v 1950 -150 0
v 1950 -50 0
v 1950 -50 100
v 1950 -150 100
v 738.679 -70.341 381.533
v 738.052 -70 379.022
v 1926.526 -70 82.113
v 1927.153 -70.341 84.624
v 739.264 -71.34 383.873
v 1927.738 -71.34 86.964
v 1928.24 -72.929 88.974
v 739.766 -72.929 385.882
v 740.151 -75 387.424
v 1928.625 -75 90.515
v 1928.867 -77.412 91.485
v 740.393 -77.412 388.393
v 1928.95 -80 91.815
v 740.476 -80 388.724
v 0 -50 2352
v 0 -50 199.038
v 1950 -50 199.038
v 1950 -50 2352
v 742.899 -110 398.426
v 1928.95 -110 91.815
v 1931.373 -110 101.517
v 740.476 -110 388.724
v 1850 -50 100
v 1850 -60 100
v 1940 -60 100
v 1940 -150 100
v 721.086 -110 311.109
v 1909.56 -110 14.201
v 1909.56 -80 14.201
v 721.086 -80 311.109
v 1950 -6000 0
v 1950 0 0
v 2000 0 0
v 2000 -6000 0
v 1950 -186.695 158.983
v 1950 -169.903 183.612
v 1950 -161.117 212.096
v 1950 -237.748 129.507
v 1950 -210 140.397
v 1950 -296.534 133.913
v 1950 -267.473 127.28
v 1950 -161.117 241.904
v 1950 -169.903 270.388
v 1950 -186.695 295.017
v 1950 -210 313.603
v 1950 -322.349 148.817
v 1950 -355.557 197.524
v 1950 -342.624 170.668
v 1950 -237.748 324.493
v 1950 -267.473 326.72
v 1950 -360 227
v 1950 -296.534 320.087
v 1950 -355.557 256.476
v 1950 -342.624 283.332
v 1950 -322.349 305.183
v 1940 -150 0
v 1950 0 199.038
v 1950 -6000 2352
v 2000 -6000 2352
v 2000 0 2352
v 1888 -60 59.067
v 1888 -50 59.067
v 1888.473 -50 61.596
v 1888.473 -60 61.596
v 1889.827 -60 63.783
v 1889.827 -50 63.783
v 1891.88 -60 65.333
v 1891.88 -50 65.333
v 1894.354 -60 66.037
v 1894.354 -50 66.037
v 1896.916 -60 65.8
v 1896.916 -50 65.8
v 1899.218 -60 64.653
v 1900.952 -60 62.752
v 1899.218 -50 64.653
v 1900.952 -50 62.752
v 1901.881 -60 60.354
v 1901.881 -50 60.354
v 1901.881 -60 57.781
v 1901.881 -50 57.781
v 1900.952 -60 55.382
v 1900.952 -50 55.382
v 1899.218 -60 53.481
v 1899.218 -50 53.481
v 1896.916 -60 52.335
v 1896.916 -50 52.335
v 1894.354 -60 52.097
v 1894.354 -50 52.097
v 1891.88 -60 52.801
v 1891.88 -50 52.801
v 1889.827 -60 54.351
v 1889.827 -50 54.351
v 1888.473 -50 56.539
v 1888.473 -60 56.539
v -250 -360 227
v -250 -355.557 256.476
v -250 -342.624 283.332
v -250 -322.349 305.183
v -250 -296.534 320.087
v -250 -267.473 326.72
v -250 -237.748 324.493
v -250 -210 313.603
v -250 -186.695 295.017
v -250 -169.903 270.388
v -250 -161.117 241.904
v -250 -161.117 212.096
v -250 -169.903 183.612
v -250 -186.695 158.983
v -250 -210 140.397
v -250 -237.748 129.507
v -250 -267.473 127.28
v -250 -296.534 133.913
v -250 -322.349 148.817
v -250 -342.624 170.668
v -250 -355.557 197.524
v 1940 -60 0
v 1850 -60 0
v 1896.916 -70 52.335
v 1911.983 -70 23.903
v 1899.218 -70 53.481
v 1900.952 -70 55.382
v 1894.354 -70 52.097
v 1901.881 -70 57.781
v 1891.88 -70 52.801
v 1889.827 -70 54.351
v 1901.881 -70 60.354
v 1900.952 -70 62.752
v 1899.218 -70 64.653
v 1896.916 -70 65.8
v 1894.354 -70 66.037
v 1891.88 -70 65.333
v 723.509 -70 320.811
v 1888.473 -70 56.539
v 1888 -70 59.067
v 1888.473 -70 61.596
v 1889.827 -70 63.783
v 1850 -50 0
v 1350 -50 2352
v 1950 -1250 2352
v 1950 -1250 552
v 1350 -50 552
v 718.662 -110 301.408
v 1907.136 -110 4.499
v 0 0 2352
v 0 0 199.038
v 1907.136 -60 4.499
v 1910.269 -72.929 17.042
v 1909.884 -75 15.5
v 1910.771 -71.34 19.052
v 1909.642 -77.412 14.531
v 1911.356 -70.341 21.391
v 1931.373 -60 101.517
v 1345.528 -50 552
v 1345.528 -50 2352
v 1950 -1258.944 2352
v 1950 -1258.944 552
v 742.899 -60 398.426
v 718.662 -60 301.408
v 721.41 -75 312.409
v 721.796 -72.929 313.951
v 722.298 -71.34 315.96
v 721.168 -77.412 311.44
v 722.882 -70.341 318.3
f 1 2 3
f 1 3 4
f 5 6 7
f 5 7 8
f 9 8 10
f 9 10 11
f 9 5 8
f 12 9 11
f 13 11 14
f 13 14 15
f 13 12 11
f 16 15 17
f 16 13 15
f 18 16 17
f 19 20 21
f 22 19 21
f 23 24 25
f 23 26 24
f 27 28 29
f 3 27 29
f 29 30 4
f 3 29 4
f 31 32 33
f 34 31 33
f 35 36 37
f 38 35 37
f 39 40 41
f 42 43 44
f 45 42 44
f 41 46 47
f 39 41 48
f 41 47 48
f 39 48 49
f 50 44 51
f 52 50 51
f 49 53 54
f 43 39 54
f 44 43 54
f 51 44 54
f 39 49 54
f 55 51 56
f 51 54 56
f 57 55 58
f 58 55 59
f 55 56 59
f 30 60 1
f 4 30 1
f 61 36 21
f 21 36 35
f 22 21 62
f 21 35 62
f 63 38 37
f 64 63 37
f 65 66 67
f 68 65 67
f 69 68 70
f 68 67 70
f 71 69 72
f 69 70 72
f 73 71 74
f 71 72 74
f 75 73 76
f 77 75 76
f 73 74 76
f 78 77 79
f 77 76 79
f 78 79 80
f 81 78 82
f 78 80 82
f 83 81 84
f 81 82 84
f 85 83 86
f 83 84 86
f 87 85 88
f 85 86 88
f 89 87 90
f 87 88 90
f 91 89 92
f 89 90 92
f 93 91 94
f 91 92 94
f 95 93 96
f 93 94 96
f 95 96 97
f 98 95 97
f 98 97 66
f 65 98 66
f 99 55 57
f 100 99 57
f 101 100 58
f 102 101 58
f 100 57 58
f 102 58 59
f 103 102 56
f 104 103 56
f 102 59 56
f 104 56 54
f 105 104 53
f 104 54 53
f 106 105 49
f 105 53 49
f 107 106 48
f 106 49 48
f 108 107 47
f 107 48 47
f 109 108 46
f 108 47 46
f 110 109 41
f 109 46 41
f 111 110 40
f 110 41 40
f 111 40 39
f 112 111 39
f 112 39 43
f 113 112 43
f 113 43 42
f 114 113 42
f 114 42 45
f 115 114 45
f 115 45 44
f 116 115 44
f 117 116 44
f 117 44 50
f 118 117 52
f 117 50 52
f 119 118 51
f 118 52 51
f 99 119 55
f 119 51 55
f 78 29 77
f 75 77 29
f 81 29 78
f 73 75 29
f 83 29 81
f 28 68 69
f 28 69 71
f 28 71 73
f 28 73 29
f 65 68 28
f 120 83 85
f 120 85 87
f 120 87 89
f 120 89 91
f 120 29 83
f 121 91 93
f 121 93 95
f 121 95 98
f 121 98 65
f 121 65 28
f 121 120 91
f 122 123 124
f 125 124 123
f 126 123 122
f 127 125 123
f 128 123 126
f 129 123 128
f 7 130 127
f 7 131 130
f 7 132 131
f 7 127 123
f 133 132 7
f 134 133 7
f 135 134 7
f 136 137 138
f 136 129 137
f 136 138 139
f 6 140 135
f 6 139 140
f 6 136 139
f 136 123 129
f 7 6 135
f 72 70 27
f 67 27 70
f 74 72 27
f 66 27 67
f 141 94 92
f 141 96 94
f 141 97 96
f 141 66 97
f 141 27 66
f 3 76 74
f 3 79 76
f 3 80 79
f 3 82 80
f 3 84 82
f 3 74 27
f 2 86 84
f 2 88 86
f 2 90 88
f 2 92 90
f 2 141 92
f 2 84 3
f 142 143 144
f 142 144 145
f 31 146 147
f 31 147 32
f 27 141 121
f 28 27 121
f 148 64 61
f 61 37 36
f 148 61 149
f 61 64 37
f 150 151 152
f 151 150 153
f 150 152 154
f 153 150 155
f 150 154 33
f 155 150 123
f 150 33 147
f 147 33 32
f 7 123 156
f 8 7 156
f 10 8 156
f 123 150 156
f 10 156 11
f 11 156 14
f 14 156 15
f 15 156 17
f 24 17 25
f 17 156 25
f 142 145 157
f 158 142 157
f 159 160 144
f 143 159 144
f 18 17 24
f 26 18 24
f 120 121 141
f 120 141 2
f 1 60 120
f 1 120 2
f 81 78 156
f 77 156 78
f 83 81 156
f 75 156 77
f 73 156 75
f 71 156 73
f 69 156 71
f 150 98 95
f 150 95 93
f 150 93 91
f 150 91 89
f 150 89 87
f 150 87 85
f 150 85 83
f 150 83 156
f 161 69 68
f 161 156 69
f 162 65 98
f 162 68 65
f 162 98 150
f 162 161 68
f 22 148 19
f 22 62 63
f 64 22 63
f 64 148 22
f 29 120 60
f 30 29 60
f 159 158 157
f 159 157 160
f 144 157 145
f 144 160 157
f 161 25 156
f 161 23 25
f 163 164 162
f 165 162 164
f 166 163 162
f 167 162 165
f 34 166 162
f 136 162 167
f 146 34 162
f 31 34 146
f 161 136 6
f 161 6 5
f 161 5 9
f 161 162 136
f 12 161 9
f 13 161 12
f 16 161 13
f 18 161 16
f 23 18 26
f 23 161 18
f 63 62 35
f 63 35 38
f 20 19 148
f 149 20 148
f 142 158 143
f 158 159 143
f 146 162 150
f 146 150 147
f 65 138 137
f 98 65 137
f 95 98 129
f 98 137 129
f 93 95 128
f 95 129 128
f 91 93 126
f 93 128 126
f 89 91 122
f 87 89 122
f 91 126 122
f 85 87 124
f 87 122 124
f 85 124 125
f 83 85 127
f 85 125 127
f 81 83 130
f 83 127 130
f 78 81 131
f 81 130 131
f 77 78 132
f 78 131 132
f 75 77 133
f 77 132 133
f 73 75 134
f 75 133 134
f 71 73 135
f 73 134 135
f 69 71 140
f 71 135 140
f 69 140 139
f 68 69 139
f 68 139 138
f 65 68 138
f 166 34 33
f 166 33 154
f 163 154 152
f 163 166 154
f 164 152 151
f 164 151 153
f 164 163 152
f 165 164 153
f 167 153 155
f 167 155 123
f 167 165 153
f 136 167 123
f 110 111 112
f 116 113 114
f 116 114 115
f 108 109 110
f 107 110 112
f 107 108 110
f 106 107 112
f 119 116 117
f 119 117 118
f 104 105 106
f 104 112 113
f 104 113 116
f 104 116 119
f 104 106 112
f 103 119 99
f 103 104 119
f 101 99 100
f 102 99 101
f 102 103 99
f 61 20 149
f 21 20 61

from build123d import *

# Parameters (mm, degrees)
F0_W           = 1950
F0_H           = 50
F0_W_2         = 50
F0_H_2         = 5950
F1_DEPTH       = 2352
F2_R           = 100
F2_R_2         = 50
F3_DEPTH       = 2200
F5_DEPTH       = 1800
F6_W           = 1950
F6_H           = 199.0381479263
F7_DEPTH       = 50.001
F8_W           = 10
F8_H           = 10
F8_W_2         = 90
F8_H_2         = 90
F9_DEPTH       = 100
F13_DEPTH      = 1200
F13_DEPTH_BACK = 25
F14_D          = 14
F14_DEPTH      = 12.75
F14_TIP        = 4.2060243332
F15_D          = 14
F15_DEPTH      = 12.75
F15_TIP        = 4.2060243332


with BuildPart() as f1:
    # F0 (on Top) → F1 (new body)
    with BuildSketch(Plane.XY):
        with Locations((975, -25)):
            Rectangle(F0_W, F0_H)
        with Locations((1975, -25)):
            Rectangle(F0_W_2, F0_H)
        with Locations((1975, -3025)):
            Rectangle(F0_W_2, F0_H_2)
    extrude(amount=F1_DEPTH)

    # F6 (on face) → F7 (cut, through all)
    with BuildSketch(Plane.XZ.offset(50)):
        with Locations((975, 99.5190739632)):
            Rectangle(F6_W, F6_H)
    extrude(amount=-F7_DEPTH, mode=Mode.SUBTRACT)


with BuildPart() as f3:
    # F2 (on face) → F3 (new body)
    with BuildSketch(Plane(origin=(1950, 0, 0), x_dir=(0, -1, 0), z_dir=(-1, 0, 0))):
        with Locations((260, 227)):
            Circle(F2_R)
        with Locations((260, 227)):
            Circle(F2_R_2, mode=Mode.SUBTRACT)
        with Locations((260, 227)):
            Circle(F2_R_2)
    extrude(amount=F3_DEPTH)


with BuildPart() as f5:
    # F4 (on face) → F5 (new body)
    with BuildSketch(Plane.XY.offset(2352)):
        Polygon((1350, -50), (1345.527864045, -50), (1950, -1258.94427191), (1950, -1250), align=None)
    extrude(amount=-F5_DEPTH)


with BuildPart() as f9:
    # F8 (on face) → F9 (new body)
    with BuildSketch(Plane(origin=(0, 0, 0), x_dir=(1, 0, 0), z_dir=(0, 0, -1))):
        with Locations((1945, 55)):
            Rectangle(F8_W, F8_H)
        with Locations((1895, 55)):
            Rectangle(F8_W_2, F8_H)
        with Locations((1945, 105)):
            Rectangle(F8_W, F8_H_2)
    extrude(amount=-F9_DEPTH)

    # F15
    with Locations(Plane.XZ.offset(60)):
        with Locations((1895, 59.0673498809)):
            Hole(F15_D / 2, depth=F15_DEPTH)
            with Locations((0, 0, -(F15_DEPTH + F15_TIP / 2))):  # 118° drill point
                Cone(0, F15_D / 2, F15_TIP, mode=Mode.SUBTRACT)


with BuildPart() as f13:
    # F12 (on line) → F13 (new body, two sides)
    with BuildSketch(Plane(origin=(1769.7879097987, 0, -442.1347269633), x_dir=(0, -1, 0), z_dir=(-0.9701827628, 0, 0.2423745176))) as f13_sk:
        with BuildLine():
            Line((60, 566.6058355899), (60, 545.4111338776))
            Line((60, 545.4111338776), (60, 516.6058355899))
            Line((60, 516.6058355899), (60, 466.6058355899))
            Line((60, 466.6058355899), (110, 466.6058355899))
            Line((110, 466.6058355899), (110, 476.6058355899))
            Line((110, 476.6058355899), (80, 476.6058355899))
            ThreePointArc((80, 476.6058355899), (72.9289321881, 479.534767778), (70, 486.6058355899))
            Line((70, 486.6058355899), (70, 516.6058355899))
            Line((70, 516.6058355899), (70, 546.6058355899))
            ThreePointArc((70, 546.6058355899), (72.9289321881, 553.6769034018), (80, 556.6058355899))
            Line((80, 556.6058355899), (110, 556.6058355899))
            Line((110, 556.6058355899), (110, 566.6058355899))
            Line((110, 566.6058355899), (60, 566.6058355899))
        make_face()
    extrude(amount=F13_DEPTH)
    extrude(f13_sk.sketch, amount=-F13_DEPTH_BACK)

    # F14
    with Locations(Plane(origin=(0, -60, 0), x_dir=(1, 0, 0), z_dir=(0, 1, 0))):
        with Locations((1895, -59.0673498809)):
            Hole(F14_D / 2, depth=F14_DEPTH)
            with Locations((0, 0, -(F14_DEPTH + F14_TIP / 2))):  # 118° drill point
                Cone(0, F14_D / 2, F14_TIP, mode=Mode.SUBTRACT)


solid = Compound([f1.part, f3.part, f5.part, f9.part, f13.part])
